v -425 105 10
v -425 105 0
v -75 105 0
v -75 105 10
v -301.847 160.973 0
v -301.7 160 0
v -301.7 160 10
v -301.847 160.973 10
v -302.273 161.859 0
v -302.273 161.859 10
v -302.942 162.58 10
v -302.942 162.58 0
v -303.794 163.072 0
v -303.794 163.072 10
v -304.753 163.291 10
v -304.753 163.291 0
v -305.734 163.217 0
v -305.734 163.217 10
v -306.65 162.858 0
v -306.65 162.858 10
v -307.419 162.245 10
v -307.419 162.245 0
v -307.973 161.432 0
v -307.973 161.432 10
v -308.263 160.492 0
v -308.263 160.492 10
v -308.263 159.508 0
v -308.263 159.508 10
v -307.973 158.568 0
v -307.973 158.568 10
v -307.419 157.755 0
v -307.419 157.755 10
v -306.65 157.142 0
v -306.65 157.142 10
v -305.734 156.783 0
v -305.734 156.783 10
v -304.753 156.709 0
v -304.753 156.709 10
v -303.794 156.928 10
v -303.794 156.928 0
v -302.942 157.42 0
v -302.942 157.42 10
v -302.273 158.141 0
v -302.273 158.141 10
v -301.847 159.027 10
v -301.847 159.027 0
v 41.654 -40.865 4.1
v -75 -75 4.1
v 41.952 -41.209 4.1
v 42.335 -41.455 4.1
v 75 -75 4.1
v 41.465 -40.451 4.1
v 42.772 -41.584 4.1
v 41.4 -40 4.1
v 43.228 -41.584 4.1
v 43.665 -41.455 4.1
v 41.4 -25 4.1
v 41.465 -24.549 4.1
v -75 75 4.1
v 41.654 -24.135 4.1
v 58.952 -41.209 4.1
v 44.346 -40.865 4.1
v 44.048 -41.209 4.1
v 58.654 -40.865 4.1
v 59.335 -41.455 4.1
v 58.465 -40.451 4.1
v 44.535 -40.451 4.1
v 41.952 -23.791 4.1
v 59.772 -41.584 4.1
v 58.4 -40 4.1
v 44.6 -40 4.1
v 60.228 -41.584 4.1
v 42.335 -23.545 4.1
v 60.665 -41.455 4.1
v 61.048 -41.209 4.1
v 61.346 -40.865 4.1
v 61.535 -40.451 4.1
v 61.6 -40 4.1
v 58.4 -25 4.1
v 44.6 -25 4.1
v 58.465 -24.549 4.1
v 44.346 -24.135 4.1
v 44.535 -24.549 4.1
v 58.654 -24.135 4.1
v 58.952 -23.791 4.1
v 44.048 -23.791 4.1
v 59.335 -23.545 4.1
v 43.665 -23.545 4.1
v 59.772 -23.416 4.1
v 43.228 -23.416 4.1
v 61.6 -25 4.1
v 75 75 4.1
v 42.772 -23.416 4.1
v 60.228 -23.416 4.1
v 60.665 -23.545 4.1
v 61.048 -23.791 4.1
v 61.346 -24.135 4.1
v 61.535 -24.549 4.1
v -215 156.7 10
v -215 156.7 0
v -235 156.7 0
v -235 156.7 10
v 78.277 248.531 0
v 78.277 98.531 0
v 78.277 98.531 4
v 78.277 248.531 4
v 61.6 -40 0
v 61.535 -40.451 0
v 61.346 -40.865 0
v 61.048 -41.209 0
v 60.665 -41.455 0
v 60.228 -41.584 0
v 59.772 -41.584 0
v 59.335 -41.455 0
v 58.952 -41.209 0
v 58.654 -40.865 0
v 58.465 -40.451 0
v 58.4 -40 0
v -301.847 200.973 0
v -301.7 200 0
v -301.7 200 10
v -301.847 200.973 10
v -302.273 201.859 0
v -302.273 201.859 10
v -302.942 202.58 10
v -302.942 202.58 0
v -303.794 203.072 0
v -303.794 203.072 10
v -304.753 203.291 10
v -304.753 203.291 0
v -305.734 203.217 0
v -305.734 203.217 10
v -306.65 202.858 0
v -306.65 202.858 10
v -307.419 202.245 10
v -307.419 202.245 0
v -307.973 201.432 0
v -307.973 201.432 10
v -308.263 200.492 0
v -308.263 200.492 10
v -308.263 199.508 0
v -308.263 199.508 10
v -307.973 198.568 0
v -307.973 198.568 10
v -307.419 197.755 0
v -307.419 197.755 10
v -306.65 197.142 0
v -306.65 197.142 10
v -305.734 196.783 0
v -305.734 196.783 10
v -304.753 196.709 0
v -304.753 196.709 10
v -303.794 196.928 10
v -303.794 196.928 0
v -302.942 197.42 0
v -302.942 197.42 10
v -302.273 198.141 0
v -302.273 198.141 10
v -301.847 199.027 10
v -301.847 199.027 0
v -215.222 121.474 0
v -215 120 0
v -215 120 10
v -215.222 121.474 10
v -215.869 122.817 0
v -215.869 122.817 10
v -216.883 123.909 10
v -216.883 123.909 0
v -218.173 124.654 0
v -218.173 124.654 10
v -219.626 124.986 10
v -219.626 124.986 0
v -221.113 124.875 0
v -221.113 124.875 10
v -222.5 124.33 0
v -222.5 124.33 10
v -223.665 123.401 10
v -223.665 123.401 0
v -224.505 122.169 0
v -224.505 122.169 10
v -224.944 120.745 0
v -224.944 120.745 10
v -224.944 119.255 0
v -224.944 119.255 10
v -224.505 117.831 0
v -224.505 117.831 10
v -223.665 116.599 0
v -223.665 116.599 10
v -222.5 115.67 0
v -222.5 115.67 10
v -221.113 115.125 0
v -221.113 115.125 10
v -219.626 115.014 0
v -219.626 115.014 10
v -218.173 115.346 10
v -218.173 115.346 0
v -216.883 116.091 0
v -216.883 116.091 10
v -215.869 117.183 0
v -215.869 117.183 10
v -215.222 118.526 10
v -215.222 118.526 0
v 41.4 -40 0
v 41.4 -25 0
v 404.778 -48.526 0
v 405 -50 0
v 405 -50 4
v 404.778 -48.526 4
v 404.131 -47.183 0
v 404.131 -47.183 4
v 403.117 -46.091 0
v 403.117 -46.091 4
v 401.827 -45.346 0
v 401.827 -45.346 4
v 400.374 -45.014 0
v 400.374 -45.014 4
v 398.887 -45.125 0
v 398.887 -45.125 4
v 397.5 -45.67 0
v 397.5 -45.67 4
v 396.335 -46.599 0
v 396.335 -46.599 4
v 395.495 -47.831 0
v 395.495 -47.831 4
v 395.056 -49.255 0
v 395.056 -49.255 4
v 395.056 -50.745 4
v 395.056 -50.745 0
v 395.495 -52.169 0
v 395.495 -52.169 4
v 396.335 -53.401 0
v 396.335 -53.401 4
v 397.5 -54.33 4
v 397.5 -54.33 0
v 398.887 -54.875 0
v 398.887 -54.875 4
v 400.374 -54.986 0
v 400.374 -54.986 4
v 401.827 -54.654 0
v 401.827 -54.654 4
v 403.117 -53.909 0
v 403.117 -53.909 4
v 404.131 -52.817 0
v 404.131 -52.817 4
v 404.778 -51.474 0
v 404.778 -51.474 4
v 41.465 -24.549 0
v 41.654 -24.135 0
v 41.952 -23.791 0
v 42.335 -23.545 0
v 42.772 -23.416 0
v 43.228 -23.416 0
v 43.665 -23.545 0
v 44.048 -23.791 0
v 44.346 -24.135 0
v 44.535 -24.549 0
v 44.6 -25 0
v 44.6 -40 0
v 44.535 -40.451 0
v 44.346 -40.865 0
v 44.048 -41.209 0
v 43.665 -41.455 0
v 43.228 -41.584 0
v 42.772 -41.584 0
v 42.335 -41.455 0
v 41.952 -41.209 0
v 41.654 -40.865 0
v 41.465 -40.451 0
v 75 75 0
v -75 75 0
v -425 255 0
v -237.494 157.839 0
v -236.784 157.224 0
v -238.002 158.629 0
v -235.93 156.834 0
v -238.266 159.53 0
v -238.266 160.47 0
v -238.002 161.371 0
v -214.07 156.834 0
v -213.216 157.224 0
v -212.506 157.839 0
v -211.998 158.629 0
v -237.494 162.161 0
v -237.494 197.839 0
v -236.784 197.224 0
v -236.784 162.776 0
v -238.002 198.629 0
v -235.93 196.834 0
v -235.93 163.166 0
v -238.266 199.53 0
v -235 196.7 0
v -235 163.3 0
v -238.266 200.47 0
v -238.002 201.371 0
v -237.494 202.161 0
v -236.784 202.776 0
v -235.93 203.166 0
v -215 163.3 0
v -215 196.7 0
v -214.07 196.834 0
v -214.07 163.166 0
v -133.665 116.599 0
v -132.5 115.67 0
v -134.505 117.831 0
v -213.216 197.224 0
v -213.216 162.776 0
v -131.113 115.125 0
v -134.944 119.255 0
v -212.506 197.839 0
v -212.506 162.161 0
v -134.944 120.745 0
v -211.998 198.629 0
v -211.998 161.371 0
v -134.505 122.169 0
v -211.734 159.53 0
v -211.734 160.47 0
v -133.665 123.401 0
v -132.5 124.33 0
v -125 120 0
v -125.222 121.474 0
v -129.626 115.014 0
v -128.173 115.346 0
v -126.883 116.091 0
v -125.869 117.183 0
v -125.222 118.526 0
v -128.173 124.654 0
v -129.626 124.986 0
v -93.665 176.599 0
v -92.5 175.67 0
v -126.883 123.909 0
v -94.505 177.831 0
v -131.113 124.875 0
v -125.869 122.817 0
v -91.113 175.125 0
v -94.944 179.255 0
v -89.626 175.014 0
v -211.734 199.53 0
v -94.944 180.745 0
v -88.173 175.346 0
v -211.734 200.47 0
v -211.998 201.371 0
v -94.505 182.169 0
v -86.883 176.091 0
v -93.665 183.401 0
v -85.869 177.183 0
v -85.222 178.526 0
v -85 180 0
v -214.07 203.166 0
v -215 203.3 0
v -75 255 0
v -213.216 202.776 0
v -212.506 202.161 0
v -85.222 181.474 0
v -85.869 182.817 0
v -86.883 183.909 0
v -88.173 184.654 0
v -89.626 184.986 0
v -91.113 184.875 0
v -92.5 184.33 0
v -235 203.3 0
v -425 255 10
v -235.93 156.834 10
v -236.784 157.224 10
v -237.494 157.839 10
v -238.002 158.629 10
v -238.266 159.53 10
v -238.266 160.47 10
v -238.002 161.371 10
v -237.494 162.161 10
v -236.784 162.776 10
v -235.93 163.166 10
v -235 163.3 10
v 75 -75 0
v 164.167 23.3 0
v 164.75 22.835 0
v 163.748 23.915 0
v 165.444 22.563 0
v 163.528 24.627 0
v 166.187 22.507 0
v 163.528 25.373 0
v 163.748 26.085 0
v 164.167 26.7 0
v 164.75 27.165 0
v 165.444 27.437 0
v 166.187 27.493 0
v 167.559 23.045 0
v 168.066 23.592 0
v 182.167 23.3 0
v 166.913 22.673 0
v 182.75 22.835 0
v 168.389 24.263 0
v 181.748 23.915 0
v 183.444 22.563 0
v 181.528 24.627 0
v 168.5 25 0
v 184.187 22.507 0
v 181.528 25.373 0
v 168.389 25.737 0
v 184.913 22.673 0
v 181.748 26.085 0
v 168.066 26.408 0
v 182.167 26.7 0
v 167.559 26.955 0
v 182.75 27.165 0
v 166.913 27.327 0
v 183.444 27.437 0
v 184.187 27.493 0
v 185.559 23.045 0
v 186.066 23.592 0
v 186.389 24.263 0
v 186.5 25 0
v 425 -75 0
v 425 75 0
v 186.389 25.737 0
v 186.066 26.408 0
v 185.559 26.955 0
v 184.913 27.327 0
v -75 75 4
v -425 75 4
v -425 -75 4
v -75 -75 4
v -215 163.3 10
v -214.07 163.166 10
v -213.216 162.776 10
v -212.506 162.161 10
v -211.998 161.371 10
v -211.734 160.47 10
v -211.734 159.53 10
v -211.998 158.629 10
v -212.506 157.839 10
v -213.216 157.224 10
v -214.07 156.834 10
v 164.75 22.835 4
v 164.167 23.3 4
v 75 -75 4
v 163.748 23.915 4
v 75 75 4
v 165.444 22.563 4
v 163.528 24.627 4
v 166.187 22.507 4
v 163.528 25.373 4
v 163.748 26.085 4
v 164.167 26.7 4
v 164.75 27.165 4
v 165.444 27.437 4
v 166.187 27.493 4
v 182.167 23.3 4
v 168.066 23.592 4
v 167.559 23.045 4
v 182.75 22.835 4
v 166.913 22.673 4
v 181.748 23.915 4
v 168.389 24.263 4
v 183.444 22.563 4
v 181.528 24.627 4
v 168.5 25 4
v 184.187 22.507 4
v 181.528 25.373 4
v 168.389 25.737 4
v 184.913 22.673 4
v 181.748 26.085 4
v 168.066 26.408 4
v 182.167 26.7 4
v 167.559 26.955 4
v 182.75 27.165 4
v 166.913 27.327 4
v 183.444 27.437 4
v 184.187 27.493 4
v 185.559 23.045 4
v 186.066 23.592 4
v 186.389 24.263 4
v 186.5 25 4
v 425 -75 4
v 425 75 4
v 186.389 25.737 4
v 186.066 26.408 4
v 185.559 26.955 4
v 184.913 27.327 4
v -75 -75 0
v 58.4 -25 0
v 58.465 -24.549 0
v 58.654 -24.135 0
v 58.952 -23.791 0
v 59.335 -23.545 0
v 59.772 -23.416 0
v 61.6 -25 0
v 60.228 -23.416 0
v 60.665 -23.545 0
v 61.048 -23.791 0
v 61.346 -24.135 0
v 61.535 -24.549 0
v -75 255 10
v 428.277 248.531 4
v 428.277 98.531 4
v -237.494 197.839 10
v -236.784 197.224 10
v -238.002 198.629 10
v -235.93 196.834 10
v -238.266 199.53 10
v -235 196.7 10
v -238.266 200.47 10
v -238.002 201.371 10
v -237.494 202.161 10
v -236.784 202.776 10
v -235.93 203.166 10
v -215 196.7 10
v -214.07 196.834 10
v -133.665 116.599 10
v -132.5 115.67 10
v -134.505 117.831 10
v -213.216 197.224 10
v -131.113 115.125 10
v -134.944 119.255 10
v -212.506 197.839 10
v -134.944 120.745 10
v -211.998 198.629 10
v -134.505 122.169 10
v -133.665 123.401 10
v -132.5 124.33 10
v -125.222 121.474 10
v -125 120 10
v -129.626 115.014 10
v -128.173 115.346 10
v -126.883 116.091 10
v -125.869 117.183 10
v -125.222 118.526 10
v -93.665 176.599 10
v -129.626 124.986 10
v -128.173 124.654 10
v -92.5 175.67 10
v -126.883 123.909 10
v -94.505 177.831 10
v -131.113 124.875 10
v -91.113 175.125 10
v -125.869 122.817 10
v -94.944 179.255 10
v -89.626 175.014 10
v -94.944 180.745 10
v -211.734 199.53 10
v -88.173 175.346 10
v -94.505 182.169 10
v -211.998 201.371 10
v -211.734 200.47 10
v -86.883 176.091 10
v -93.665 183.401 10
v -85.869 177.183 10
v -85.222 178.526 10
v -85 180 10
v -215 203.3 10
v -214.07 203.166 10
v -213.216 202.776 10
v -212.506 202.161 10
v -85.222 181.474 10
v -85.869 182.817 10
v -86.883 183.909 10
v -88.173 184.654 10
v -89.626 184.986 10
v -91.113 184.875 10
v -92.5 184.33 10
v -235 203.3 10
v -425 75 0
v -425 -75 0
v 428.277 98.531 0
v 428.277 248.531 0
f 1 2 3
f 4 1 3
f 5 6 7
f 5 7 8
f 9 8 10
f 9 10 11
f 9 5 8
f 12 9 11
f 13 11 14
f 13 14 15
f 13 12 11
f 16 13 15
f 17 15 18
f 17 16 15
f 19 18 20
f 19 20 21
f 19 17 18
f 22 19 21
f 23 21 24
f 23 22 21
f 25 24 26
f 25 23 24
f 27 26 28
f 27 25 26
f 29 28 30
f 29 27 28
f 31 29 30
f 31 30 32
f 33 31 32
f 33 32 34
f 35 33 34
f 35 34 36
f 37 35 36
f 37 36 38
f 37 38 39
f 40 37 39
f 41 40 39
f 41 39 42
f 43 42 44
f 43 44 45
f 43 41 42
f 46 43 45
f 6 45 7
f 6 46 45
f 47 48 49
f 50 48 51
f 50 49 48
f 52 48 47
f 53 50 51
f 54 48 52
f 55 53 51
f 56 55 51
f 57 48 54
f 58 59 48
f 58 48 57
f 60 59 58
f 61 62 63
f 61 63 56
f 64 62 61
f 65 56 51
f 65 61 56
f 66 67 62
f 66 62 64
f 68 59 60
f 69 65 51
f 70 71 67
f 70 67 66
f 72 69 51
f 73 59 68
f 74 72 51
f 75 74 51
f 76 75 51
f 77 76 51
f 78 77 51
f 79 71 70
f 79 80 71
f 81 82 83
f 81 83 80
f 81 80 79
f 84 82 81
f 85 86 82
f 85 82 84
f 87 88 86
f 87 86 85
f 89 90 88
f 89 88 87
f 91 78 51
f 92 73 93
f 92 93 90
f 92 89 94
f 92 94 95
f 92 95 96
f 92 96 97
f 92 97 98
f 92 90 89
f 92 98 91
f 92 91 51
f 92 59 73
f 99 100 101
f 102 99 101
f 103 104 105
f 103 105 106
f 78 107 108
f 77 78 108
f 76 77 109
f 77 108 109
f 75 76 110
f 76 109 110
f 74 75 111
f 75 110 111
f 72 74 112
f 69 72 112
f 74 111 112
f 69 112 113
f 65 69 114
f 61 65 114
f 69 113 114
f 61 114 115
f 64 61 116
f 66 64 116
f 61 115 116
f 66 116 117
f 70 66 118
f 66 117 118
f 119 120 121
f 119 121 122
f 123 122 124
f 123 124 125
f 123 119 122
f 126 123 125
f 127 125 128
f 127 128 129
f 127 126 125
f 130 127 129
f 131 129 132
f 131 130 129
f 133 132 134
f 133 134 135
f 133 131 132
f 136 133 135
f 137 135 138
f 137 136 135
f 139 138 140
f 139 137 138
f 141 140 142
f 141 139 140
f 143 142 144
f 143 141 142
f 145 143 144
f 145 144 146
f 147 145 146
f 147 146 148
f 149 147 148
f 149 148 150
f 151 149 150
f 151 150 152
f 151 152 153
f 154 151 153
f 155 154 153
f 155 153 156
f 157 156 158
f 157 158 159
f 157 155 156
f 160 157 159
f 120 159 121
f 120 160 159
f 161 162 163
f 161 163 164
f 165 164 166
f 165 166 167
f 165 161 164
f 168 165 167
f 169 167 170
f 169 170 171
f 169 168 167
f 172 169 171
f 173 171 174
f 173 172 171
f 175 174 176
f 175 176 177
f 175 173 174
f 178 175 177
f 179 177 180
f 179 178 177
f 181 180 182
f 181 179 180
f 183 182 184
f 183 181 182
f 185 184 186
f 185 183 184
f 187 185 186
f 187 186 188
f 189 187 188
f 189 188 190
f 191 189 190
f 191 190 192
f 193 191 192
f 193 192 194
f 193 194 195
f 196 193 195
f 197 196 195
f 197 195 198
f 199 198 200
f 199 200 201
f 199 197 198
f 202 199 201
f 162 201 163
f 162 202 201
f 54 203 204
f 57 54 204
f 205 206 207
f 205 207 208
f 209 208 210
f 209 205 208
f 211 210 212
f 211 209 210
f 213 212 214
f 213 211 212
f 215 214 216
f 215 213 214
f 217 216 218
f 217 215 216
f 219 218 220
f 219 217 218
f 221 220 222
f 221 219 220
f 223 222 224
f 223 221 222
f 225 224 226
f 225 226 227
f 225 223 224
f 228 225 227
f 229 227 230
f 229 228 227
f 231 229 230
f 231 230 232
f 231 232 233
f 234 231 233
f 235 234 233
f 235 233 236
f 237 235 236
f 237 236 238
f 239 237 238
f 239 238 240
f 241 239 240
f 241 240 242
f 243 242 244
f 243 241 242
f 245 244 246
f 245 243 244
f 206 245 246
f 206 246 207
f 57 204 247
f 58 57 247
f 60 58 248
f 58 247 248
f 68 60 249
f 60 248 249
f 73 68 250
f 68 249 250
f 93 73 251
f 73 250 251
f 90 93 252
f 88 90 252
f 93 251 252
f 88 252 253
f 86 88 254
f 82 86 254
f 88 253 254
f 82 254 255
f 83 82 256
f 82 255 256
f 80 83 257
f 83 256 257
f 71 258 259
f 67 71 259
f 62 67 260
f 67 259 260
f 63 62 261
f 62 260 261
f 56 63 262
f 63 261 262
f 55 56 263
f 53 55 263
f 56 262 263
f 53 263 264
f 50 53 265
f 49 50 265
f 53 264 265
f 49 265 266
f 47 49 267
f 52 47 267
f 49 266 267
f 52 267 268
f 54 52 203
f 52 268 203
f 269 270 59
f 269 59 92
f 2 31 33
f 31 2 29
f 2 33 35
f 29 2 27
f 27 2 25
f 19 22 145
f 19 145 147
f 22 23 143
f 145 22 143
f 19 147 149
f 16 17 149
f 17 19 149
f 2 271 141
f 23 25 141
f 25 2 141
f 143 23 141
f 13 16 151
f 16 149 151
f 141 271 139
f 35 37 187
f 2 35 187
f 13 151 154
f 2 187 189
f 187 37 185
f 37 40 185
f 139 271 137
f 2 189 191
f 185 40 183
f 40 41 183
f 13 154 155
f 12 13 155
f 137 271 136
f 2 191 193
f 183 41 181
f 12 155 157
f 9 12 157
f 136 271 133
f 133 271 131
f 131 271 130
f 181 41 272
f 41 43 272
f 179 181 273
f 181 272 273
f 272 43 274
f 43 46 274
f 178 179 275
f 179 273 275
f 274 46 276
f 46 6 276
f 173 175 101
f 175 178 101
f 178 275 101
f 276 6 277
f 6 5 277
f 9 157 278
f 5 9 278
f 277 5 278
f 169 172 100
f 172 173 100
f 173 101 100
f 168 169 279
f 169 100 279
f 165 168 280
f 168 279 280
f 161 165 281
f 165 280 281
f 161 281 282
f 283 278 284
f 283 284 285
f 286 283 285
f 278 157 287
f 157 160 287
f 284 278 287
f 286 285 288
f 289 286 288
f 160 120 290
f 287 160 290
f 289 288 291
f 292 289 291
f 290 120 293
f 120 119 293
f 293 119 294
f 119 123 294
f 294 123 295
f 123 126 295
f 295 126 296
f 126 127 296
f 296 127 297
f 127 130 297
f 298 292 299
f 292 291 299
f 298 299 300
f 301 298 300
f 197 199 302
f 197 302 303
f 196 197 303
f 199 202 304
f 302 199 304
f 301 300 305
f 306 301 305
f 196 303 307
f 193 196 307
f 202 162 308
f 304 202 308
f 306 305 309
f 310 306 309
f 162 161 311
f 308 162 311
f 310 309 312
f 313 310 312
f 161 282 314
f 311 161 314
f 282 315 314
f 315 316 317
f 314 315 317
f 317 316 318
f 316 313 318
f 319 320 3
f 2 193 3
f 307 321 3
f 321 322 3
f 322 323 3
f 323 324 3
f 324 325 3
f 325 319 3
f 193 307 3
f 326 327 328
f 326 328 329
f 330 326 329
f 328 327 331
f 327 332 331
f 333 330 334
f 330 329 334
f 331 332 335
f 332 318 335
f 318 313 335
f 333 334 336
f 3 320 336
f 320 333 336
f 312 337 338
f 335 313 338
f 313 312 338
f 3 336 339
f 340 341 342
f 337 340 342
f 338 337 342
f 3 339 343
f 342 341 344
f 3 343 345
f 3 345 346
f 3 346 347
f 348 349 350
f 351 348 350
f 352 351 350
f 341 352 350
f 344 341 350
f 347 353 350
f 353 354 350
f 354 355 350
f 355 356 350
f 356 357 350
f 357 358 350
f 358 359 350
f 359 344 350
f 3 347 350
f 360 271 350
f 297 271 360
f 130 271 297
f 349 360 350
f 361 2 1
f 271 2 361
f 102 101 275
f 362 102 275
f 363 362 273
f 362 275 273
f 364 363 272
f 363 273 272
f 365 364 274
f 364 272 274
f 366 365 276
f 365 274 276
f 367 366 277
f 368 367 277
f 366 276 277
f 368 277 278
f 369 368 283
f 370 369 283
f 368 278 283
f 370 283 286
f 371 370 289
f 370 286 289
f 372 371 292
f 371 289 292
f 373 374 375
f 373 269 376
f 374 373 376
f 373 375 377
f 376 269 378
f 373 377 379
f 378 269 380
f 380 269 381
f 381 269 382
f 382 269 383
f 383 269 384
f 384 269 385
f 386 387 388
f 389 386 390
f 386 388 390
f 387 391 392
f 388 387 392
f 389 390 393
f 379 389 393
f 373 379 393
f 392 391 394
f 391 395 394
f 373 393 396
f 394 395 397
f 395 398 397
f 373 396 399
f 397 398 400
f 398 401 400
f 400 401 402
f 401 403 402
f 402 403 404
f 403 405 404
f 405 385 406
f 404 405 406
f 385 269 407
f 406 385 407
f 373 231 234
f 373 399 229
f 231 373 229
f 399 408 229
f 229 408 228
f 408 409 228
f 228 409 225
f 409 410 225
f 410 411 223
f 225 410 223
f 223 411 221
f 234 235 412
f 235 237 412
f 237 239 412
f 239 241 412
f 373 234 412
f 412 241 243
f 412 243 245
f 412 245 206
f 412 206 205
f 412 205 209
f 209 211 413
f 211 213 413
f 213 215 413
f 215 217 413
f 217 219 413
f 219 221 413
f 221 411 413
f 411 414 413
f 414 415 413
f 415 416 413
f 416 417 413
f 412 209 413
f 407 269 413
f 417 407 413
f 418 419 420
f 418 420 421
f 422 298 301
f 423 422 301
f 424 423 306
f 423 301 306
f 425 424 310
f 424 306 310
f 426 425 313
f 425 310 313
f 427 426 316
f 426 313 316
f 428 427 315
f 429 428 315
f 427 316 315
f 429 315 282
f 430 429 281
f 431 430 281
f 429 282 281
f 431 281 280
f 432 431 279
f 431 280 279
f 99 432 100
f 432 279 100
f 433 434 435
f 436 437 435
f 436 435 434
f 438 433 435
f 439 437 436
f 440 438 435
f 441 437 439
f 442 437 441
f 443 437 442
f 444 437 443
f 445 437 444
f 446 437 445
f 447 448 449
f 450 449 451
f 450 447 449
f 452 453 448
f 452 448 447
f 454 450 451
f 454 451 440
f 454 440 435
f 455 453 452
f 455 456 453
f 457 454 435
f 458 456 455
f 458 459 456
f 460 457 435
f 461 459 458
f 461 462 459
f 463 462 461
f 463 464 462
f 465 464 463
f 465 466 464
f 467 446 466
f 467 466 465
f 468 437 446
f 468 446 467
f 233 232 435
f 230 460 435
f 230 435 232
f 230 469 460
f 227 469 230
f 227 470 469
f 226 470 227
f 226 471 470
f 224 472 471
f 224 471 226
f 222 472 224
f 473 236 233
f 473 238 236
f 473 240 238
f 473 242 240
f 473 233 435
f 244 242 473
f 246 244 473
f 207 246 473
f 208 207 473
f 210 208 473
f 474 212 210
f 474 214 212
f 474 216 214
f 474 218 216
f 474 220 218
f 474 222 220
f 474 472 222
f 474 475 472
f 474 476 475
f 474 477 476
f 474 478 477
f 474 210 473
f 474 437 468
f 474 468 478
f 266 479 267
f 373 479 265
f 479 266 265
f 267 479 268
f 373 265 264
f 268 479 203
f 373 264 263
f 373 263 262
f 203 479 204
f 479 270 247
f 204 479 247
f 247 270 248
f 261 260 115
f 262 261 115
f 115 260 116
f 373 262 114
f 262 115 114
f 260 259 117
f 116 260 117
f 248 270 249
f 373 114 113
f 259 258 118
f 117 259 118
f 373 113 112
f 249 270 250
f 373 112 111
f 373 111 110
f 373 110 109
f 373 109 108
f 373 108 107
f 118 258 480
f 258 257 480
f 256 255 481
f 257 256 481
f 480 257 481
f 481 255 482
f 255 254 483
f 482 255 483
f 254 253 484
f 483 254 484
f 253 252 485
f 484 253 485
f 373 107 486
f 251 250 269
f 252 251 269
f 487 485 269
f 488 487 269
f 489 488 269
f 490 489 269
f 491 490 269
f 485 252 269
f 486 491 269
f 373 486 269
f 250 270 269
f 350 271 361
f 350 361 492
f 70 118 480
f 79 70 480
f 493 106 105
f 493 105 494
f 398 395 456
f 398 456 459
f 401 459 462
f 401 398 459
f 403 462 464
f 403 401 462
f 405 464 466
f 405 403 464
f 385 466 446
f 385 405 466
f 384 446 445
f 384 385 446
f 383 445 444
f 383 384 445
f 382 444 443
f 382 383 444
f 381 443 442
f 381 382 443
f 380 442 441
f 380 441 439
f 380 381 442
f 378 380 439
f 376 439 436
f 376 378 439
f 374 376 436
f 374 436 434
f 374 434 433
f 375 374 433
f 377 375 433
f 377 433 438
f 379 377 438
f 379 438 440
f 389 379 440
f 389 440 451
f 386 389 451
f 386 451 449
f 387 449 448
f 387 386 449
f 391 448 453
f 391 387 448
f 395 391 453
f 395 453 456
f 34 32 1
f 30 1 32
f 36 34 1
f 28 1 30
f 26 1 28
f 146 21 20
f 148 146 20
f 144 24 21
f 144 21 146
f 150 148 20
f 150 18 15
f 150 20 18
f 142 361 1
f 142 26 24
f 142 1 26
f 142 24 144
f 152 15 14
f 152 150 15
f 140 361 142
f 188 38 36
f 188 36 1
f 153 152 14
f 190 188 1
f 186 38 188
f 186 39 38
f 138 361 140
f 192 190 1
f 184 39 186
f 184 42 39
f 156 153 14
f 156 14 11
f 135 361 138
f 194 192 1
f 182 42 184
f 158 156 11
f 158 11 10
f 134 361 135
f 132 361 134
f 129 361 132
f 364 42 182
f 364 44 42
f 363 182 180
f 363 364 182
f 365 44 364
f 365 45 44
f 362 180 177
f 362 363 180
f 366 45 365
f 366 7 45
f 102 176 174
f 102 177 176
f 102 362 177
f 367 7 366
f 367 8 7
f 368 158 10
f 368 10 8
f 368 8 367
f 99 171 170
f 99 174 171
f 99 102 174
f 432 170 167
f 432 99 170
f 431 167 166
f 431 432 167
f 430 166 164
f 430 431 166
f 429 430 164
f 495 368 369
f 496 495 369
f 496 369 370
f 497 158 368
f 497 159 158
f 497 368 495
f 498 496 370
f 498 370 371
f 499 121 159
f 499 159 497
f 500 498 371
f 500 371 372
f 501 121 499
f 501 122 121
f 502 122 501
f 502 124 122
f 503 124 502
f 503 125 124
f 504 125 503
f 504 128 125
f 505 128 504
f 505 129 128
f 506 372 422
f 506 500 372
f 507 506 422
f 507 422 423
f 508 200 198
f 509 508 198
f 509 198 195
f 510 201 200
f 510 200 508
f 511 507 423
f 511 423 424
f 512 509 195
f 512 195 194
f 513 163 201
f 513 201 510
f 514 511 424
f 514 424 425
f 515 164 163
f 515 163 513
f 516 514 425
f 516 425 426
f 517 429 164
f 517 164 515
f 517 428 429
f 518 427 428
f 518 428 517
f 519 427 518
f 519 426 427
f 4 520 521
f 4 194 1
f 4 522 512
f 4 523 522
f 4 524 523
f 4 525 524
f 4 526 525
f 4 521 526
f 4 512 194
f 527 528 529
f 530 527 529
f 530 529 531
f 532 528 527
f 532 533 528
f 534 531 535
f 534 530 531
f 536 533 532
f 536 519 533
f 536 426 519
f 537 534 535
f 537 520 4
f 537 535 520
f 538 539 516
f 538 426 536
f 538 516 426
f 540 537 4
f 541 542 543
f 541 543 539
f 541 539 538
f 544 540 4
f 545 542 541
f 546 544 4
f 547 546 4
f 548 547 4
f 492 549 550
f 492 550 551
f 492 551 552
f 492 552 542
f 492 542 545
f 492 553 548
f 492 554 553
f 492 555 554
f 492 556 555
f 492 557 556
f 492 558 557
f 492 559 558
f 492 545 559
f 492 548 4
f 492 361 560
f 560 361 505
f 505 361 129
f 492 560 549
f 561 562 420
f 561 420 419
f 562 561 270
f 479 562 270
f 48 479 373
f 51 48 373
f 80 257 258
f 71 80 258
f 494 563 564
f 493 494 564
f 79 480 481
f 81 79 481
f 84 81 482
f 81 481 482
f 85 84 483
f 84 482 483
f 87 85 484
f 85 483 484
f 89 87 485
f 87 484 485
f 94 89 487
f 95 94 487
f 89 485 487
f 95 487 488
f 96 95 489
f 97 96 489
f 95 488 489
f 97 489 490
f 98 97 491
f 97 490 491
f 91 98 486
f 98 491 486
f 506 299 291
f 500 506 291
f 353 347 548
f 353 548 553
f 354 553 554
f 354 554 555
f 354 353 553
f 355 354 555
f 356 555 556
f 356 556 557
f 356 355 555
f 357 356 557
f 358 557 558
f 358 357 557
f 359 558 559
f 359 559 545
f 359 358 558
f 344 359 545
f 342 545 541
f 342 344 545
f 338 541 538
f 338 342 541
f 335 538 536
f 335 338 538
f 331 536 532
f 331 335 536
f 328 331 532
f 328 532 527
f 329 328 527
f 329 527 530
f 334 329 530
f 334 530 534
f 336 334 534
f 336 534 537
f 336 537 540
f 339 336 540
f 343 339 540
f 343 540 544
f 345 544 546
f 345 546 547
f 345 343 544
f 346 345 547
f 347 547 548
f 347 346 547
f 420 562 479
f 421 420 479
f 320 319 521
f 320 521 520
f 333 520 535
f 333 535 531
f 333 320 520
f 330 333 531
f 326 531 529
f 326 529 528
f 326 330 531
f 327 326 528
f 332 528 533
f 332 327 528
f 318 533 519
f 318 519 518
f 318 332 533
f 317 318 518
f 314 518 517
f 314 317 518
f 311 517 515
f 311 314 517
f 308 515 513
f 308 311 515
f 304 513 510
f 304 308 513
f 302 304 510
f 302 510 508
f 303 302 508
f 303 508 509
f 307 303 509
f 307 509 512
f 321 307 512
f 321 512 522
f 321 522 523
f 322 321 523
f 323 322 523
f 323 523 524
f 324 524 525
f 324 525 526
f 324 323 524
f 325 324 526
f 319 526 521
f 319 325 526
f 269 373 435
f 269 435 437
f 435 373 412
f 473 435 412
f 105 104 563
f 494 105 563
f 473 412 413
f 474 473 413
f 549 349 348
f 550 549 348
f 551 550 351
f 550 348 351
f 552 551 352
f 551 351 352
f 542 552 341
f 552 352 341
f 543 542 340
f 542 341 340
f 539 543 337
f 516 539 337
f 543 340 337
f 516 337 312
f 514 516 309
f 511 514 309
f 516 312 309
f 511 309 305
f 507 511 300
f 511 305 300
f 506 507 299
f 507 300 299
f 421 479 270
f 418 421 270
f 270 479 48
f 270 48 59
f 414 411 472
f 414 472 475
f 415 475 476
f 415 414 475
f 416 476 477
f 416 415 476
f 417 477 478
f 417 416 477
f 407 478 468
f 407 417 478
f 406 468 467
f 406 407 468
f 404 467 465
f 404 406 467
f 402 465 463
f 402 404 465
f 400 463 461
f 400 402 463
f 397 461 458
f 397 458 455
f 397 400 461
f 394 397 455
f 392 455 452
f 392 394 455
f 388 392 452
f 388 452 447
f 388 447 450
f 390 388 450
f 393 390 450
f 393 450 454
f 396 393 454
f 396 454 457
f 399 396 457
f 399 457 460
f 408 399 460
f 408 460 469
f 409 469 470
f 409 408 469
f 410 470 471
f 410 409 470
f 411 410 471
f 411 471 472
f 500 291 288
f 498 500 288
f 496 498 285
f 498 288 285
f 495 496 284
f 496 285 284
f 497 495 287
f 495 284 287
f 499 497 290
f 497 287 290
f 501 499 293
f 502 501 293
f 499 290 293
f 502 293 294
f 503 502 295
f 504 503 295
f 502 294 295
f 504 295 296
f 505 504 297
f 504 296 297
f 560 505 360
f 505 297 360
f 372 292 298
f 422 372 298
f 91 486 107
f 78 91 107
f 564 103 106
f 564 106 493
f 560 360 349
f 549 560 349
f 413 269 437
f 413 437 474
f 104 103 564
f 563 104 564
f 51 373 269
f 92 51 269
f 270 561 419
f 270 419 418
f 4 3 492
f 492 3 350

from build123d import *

# Parameters (mm, degrees)
F0_W     = 350
F0_H     = 150
F0_R     = 5
F0_R_2   = 2.5
F1_DEPTH = 4
F0_W_2   = 150
F2_DEPTH = 4.1
F3_W     = 350
F3_H     = 150
F3_R     = 3.3
F3_R_2   = 5
F4_DEPTH = 10
F5_W     = 350
F5_H     = 150
F6_DEPTH = 4


with BuildPart() as f1:
    # F0 (on Top) → F1 (new body)
    with BuildSketch(Plane.XY):
        with Locations((-250, 0)):
            Rectangle(F0_W, F0_H)
        with Locations((250, 0)):
            Rectangle(F0_W, F0_H)
        with Locations((400, -50)):
            Circle(F0_R, mode=Mode.SUBTRACT)
        with Locations((166, 25)):
            Circle(F0_R_2, mode=Mode.SUBTRACT)
        with Locations((184, 25)):
            Circle(F0_R_2, mode=Mode.SUBTRACT)
    extrude(amount=F1_DEPTH)


with BuildPart() as f2:
    # F0 (on Top) → F2 (new body)
    with BuildSketch(Plane.XY):
        Rectangle(F0_W_2, F0_H)
        with BuildLine():
            Line((44.6, -25), (44.6, -40))
            ThreePointArc((44.6, -40), (43, -41.6), (41.4, -40))
            Line((41.4, -40), (41.4, -25))
            ThreePointArc((41.4, -25), (43, -23.4), (44.6, -25))
        make_face(mode=Mode.SUBTRACT)
        with BuildLine():
            Line((61.6, -25), (61.6, -40))
            ThreePointArc((61.6, -40), (60, -41.6), (58.4, -40))
            Line((58.4, -40), (58.4, -25))
            ThreePointArc((58.4, -25), (60, -23.4), (61.6, -25))
        make_face(mode=Mode.SUBTRACT)
    extrude(amount=F2_DEPTH)


with BuildPart() as f4:
    # F3 (on Top) → F4 (new body)
    with BuildSketch(Plane.XY):
        with Locations((-250, 180)):
            Rectangle(F3_W, F3_H)
        with Locations((-305, 160)):
            Circle(F3_R, mode=Mode.SUBTRACT)
        with Locations((-220, 120)):
            Circle(F3_R_2, mode=Mode.SUBTRACT)
        with Locations((-130, 120)):
            Circle(F3_R_2, mode=Mode.SUBTRACT)
        with BuildLine():
            Line((-235, 163.3), (-215, 163.3))
            ThreePointArc((-215, 163.3), (-211.7, 160), (-215, 156.7))
            Line((-215, 156.7), (-235, 156.7))
            ThreePointArc((-235, 156.7), (-238.3, 160), (-235, 163.3))
        make_face(mode=Mode.SUBTRACT)
        with Locations((-305, 200)):
            Circle(F3_R, mode=Mode.SUBTRACT)
        with BuildLine():
            Line((-235, 203.3), (-215, 203.3))
            ThreePointArc((-215, 203.3), (-211.7, 200), (-215, 196.7))
            Line((-215, 196.7), (-235, 196.7))
            ThreePointArc((-235, 196.7), (-238.3, 200), (-235, 203.3))
        make_face(mode=Mode.SUBTRACT)
        with Locations((-90, 180)):
            Circle(F3_R_2, mode=Mode.SUBTRACT)
    extrude(amount=F4_DEPTH)


with BuildPart() as f6:
    # F5 (on Top) → F6 (new body)
    with BuildSketch(Plane.XY):
        with Locations((253.276501, 173.531229)):
            Rectangle(F5_W, F5_H)
    extrude(amount=F6_DEPTH)


solid = Compound([f1.part, f2.part, f4.part, f6.part])
